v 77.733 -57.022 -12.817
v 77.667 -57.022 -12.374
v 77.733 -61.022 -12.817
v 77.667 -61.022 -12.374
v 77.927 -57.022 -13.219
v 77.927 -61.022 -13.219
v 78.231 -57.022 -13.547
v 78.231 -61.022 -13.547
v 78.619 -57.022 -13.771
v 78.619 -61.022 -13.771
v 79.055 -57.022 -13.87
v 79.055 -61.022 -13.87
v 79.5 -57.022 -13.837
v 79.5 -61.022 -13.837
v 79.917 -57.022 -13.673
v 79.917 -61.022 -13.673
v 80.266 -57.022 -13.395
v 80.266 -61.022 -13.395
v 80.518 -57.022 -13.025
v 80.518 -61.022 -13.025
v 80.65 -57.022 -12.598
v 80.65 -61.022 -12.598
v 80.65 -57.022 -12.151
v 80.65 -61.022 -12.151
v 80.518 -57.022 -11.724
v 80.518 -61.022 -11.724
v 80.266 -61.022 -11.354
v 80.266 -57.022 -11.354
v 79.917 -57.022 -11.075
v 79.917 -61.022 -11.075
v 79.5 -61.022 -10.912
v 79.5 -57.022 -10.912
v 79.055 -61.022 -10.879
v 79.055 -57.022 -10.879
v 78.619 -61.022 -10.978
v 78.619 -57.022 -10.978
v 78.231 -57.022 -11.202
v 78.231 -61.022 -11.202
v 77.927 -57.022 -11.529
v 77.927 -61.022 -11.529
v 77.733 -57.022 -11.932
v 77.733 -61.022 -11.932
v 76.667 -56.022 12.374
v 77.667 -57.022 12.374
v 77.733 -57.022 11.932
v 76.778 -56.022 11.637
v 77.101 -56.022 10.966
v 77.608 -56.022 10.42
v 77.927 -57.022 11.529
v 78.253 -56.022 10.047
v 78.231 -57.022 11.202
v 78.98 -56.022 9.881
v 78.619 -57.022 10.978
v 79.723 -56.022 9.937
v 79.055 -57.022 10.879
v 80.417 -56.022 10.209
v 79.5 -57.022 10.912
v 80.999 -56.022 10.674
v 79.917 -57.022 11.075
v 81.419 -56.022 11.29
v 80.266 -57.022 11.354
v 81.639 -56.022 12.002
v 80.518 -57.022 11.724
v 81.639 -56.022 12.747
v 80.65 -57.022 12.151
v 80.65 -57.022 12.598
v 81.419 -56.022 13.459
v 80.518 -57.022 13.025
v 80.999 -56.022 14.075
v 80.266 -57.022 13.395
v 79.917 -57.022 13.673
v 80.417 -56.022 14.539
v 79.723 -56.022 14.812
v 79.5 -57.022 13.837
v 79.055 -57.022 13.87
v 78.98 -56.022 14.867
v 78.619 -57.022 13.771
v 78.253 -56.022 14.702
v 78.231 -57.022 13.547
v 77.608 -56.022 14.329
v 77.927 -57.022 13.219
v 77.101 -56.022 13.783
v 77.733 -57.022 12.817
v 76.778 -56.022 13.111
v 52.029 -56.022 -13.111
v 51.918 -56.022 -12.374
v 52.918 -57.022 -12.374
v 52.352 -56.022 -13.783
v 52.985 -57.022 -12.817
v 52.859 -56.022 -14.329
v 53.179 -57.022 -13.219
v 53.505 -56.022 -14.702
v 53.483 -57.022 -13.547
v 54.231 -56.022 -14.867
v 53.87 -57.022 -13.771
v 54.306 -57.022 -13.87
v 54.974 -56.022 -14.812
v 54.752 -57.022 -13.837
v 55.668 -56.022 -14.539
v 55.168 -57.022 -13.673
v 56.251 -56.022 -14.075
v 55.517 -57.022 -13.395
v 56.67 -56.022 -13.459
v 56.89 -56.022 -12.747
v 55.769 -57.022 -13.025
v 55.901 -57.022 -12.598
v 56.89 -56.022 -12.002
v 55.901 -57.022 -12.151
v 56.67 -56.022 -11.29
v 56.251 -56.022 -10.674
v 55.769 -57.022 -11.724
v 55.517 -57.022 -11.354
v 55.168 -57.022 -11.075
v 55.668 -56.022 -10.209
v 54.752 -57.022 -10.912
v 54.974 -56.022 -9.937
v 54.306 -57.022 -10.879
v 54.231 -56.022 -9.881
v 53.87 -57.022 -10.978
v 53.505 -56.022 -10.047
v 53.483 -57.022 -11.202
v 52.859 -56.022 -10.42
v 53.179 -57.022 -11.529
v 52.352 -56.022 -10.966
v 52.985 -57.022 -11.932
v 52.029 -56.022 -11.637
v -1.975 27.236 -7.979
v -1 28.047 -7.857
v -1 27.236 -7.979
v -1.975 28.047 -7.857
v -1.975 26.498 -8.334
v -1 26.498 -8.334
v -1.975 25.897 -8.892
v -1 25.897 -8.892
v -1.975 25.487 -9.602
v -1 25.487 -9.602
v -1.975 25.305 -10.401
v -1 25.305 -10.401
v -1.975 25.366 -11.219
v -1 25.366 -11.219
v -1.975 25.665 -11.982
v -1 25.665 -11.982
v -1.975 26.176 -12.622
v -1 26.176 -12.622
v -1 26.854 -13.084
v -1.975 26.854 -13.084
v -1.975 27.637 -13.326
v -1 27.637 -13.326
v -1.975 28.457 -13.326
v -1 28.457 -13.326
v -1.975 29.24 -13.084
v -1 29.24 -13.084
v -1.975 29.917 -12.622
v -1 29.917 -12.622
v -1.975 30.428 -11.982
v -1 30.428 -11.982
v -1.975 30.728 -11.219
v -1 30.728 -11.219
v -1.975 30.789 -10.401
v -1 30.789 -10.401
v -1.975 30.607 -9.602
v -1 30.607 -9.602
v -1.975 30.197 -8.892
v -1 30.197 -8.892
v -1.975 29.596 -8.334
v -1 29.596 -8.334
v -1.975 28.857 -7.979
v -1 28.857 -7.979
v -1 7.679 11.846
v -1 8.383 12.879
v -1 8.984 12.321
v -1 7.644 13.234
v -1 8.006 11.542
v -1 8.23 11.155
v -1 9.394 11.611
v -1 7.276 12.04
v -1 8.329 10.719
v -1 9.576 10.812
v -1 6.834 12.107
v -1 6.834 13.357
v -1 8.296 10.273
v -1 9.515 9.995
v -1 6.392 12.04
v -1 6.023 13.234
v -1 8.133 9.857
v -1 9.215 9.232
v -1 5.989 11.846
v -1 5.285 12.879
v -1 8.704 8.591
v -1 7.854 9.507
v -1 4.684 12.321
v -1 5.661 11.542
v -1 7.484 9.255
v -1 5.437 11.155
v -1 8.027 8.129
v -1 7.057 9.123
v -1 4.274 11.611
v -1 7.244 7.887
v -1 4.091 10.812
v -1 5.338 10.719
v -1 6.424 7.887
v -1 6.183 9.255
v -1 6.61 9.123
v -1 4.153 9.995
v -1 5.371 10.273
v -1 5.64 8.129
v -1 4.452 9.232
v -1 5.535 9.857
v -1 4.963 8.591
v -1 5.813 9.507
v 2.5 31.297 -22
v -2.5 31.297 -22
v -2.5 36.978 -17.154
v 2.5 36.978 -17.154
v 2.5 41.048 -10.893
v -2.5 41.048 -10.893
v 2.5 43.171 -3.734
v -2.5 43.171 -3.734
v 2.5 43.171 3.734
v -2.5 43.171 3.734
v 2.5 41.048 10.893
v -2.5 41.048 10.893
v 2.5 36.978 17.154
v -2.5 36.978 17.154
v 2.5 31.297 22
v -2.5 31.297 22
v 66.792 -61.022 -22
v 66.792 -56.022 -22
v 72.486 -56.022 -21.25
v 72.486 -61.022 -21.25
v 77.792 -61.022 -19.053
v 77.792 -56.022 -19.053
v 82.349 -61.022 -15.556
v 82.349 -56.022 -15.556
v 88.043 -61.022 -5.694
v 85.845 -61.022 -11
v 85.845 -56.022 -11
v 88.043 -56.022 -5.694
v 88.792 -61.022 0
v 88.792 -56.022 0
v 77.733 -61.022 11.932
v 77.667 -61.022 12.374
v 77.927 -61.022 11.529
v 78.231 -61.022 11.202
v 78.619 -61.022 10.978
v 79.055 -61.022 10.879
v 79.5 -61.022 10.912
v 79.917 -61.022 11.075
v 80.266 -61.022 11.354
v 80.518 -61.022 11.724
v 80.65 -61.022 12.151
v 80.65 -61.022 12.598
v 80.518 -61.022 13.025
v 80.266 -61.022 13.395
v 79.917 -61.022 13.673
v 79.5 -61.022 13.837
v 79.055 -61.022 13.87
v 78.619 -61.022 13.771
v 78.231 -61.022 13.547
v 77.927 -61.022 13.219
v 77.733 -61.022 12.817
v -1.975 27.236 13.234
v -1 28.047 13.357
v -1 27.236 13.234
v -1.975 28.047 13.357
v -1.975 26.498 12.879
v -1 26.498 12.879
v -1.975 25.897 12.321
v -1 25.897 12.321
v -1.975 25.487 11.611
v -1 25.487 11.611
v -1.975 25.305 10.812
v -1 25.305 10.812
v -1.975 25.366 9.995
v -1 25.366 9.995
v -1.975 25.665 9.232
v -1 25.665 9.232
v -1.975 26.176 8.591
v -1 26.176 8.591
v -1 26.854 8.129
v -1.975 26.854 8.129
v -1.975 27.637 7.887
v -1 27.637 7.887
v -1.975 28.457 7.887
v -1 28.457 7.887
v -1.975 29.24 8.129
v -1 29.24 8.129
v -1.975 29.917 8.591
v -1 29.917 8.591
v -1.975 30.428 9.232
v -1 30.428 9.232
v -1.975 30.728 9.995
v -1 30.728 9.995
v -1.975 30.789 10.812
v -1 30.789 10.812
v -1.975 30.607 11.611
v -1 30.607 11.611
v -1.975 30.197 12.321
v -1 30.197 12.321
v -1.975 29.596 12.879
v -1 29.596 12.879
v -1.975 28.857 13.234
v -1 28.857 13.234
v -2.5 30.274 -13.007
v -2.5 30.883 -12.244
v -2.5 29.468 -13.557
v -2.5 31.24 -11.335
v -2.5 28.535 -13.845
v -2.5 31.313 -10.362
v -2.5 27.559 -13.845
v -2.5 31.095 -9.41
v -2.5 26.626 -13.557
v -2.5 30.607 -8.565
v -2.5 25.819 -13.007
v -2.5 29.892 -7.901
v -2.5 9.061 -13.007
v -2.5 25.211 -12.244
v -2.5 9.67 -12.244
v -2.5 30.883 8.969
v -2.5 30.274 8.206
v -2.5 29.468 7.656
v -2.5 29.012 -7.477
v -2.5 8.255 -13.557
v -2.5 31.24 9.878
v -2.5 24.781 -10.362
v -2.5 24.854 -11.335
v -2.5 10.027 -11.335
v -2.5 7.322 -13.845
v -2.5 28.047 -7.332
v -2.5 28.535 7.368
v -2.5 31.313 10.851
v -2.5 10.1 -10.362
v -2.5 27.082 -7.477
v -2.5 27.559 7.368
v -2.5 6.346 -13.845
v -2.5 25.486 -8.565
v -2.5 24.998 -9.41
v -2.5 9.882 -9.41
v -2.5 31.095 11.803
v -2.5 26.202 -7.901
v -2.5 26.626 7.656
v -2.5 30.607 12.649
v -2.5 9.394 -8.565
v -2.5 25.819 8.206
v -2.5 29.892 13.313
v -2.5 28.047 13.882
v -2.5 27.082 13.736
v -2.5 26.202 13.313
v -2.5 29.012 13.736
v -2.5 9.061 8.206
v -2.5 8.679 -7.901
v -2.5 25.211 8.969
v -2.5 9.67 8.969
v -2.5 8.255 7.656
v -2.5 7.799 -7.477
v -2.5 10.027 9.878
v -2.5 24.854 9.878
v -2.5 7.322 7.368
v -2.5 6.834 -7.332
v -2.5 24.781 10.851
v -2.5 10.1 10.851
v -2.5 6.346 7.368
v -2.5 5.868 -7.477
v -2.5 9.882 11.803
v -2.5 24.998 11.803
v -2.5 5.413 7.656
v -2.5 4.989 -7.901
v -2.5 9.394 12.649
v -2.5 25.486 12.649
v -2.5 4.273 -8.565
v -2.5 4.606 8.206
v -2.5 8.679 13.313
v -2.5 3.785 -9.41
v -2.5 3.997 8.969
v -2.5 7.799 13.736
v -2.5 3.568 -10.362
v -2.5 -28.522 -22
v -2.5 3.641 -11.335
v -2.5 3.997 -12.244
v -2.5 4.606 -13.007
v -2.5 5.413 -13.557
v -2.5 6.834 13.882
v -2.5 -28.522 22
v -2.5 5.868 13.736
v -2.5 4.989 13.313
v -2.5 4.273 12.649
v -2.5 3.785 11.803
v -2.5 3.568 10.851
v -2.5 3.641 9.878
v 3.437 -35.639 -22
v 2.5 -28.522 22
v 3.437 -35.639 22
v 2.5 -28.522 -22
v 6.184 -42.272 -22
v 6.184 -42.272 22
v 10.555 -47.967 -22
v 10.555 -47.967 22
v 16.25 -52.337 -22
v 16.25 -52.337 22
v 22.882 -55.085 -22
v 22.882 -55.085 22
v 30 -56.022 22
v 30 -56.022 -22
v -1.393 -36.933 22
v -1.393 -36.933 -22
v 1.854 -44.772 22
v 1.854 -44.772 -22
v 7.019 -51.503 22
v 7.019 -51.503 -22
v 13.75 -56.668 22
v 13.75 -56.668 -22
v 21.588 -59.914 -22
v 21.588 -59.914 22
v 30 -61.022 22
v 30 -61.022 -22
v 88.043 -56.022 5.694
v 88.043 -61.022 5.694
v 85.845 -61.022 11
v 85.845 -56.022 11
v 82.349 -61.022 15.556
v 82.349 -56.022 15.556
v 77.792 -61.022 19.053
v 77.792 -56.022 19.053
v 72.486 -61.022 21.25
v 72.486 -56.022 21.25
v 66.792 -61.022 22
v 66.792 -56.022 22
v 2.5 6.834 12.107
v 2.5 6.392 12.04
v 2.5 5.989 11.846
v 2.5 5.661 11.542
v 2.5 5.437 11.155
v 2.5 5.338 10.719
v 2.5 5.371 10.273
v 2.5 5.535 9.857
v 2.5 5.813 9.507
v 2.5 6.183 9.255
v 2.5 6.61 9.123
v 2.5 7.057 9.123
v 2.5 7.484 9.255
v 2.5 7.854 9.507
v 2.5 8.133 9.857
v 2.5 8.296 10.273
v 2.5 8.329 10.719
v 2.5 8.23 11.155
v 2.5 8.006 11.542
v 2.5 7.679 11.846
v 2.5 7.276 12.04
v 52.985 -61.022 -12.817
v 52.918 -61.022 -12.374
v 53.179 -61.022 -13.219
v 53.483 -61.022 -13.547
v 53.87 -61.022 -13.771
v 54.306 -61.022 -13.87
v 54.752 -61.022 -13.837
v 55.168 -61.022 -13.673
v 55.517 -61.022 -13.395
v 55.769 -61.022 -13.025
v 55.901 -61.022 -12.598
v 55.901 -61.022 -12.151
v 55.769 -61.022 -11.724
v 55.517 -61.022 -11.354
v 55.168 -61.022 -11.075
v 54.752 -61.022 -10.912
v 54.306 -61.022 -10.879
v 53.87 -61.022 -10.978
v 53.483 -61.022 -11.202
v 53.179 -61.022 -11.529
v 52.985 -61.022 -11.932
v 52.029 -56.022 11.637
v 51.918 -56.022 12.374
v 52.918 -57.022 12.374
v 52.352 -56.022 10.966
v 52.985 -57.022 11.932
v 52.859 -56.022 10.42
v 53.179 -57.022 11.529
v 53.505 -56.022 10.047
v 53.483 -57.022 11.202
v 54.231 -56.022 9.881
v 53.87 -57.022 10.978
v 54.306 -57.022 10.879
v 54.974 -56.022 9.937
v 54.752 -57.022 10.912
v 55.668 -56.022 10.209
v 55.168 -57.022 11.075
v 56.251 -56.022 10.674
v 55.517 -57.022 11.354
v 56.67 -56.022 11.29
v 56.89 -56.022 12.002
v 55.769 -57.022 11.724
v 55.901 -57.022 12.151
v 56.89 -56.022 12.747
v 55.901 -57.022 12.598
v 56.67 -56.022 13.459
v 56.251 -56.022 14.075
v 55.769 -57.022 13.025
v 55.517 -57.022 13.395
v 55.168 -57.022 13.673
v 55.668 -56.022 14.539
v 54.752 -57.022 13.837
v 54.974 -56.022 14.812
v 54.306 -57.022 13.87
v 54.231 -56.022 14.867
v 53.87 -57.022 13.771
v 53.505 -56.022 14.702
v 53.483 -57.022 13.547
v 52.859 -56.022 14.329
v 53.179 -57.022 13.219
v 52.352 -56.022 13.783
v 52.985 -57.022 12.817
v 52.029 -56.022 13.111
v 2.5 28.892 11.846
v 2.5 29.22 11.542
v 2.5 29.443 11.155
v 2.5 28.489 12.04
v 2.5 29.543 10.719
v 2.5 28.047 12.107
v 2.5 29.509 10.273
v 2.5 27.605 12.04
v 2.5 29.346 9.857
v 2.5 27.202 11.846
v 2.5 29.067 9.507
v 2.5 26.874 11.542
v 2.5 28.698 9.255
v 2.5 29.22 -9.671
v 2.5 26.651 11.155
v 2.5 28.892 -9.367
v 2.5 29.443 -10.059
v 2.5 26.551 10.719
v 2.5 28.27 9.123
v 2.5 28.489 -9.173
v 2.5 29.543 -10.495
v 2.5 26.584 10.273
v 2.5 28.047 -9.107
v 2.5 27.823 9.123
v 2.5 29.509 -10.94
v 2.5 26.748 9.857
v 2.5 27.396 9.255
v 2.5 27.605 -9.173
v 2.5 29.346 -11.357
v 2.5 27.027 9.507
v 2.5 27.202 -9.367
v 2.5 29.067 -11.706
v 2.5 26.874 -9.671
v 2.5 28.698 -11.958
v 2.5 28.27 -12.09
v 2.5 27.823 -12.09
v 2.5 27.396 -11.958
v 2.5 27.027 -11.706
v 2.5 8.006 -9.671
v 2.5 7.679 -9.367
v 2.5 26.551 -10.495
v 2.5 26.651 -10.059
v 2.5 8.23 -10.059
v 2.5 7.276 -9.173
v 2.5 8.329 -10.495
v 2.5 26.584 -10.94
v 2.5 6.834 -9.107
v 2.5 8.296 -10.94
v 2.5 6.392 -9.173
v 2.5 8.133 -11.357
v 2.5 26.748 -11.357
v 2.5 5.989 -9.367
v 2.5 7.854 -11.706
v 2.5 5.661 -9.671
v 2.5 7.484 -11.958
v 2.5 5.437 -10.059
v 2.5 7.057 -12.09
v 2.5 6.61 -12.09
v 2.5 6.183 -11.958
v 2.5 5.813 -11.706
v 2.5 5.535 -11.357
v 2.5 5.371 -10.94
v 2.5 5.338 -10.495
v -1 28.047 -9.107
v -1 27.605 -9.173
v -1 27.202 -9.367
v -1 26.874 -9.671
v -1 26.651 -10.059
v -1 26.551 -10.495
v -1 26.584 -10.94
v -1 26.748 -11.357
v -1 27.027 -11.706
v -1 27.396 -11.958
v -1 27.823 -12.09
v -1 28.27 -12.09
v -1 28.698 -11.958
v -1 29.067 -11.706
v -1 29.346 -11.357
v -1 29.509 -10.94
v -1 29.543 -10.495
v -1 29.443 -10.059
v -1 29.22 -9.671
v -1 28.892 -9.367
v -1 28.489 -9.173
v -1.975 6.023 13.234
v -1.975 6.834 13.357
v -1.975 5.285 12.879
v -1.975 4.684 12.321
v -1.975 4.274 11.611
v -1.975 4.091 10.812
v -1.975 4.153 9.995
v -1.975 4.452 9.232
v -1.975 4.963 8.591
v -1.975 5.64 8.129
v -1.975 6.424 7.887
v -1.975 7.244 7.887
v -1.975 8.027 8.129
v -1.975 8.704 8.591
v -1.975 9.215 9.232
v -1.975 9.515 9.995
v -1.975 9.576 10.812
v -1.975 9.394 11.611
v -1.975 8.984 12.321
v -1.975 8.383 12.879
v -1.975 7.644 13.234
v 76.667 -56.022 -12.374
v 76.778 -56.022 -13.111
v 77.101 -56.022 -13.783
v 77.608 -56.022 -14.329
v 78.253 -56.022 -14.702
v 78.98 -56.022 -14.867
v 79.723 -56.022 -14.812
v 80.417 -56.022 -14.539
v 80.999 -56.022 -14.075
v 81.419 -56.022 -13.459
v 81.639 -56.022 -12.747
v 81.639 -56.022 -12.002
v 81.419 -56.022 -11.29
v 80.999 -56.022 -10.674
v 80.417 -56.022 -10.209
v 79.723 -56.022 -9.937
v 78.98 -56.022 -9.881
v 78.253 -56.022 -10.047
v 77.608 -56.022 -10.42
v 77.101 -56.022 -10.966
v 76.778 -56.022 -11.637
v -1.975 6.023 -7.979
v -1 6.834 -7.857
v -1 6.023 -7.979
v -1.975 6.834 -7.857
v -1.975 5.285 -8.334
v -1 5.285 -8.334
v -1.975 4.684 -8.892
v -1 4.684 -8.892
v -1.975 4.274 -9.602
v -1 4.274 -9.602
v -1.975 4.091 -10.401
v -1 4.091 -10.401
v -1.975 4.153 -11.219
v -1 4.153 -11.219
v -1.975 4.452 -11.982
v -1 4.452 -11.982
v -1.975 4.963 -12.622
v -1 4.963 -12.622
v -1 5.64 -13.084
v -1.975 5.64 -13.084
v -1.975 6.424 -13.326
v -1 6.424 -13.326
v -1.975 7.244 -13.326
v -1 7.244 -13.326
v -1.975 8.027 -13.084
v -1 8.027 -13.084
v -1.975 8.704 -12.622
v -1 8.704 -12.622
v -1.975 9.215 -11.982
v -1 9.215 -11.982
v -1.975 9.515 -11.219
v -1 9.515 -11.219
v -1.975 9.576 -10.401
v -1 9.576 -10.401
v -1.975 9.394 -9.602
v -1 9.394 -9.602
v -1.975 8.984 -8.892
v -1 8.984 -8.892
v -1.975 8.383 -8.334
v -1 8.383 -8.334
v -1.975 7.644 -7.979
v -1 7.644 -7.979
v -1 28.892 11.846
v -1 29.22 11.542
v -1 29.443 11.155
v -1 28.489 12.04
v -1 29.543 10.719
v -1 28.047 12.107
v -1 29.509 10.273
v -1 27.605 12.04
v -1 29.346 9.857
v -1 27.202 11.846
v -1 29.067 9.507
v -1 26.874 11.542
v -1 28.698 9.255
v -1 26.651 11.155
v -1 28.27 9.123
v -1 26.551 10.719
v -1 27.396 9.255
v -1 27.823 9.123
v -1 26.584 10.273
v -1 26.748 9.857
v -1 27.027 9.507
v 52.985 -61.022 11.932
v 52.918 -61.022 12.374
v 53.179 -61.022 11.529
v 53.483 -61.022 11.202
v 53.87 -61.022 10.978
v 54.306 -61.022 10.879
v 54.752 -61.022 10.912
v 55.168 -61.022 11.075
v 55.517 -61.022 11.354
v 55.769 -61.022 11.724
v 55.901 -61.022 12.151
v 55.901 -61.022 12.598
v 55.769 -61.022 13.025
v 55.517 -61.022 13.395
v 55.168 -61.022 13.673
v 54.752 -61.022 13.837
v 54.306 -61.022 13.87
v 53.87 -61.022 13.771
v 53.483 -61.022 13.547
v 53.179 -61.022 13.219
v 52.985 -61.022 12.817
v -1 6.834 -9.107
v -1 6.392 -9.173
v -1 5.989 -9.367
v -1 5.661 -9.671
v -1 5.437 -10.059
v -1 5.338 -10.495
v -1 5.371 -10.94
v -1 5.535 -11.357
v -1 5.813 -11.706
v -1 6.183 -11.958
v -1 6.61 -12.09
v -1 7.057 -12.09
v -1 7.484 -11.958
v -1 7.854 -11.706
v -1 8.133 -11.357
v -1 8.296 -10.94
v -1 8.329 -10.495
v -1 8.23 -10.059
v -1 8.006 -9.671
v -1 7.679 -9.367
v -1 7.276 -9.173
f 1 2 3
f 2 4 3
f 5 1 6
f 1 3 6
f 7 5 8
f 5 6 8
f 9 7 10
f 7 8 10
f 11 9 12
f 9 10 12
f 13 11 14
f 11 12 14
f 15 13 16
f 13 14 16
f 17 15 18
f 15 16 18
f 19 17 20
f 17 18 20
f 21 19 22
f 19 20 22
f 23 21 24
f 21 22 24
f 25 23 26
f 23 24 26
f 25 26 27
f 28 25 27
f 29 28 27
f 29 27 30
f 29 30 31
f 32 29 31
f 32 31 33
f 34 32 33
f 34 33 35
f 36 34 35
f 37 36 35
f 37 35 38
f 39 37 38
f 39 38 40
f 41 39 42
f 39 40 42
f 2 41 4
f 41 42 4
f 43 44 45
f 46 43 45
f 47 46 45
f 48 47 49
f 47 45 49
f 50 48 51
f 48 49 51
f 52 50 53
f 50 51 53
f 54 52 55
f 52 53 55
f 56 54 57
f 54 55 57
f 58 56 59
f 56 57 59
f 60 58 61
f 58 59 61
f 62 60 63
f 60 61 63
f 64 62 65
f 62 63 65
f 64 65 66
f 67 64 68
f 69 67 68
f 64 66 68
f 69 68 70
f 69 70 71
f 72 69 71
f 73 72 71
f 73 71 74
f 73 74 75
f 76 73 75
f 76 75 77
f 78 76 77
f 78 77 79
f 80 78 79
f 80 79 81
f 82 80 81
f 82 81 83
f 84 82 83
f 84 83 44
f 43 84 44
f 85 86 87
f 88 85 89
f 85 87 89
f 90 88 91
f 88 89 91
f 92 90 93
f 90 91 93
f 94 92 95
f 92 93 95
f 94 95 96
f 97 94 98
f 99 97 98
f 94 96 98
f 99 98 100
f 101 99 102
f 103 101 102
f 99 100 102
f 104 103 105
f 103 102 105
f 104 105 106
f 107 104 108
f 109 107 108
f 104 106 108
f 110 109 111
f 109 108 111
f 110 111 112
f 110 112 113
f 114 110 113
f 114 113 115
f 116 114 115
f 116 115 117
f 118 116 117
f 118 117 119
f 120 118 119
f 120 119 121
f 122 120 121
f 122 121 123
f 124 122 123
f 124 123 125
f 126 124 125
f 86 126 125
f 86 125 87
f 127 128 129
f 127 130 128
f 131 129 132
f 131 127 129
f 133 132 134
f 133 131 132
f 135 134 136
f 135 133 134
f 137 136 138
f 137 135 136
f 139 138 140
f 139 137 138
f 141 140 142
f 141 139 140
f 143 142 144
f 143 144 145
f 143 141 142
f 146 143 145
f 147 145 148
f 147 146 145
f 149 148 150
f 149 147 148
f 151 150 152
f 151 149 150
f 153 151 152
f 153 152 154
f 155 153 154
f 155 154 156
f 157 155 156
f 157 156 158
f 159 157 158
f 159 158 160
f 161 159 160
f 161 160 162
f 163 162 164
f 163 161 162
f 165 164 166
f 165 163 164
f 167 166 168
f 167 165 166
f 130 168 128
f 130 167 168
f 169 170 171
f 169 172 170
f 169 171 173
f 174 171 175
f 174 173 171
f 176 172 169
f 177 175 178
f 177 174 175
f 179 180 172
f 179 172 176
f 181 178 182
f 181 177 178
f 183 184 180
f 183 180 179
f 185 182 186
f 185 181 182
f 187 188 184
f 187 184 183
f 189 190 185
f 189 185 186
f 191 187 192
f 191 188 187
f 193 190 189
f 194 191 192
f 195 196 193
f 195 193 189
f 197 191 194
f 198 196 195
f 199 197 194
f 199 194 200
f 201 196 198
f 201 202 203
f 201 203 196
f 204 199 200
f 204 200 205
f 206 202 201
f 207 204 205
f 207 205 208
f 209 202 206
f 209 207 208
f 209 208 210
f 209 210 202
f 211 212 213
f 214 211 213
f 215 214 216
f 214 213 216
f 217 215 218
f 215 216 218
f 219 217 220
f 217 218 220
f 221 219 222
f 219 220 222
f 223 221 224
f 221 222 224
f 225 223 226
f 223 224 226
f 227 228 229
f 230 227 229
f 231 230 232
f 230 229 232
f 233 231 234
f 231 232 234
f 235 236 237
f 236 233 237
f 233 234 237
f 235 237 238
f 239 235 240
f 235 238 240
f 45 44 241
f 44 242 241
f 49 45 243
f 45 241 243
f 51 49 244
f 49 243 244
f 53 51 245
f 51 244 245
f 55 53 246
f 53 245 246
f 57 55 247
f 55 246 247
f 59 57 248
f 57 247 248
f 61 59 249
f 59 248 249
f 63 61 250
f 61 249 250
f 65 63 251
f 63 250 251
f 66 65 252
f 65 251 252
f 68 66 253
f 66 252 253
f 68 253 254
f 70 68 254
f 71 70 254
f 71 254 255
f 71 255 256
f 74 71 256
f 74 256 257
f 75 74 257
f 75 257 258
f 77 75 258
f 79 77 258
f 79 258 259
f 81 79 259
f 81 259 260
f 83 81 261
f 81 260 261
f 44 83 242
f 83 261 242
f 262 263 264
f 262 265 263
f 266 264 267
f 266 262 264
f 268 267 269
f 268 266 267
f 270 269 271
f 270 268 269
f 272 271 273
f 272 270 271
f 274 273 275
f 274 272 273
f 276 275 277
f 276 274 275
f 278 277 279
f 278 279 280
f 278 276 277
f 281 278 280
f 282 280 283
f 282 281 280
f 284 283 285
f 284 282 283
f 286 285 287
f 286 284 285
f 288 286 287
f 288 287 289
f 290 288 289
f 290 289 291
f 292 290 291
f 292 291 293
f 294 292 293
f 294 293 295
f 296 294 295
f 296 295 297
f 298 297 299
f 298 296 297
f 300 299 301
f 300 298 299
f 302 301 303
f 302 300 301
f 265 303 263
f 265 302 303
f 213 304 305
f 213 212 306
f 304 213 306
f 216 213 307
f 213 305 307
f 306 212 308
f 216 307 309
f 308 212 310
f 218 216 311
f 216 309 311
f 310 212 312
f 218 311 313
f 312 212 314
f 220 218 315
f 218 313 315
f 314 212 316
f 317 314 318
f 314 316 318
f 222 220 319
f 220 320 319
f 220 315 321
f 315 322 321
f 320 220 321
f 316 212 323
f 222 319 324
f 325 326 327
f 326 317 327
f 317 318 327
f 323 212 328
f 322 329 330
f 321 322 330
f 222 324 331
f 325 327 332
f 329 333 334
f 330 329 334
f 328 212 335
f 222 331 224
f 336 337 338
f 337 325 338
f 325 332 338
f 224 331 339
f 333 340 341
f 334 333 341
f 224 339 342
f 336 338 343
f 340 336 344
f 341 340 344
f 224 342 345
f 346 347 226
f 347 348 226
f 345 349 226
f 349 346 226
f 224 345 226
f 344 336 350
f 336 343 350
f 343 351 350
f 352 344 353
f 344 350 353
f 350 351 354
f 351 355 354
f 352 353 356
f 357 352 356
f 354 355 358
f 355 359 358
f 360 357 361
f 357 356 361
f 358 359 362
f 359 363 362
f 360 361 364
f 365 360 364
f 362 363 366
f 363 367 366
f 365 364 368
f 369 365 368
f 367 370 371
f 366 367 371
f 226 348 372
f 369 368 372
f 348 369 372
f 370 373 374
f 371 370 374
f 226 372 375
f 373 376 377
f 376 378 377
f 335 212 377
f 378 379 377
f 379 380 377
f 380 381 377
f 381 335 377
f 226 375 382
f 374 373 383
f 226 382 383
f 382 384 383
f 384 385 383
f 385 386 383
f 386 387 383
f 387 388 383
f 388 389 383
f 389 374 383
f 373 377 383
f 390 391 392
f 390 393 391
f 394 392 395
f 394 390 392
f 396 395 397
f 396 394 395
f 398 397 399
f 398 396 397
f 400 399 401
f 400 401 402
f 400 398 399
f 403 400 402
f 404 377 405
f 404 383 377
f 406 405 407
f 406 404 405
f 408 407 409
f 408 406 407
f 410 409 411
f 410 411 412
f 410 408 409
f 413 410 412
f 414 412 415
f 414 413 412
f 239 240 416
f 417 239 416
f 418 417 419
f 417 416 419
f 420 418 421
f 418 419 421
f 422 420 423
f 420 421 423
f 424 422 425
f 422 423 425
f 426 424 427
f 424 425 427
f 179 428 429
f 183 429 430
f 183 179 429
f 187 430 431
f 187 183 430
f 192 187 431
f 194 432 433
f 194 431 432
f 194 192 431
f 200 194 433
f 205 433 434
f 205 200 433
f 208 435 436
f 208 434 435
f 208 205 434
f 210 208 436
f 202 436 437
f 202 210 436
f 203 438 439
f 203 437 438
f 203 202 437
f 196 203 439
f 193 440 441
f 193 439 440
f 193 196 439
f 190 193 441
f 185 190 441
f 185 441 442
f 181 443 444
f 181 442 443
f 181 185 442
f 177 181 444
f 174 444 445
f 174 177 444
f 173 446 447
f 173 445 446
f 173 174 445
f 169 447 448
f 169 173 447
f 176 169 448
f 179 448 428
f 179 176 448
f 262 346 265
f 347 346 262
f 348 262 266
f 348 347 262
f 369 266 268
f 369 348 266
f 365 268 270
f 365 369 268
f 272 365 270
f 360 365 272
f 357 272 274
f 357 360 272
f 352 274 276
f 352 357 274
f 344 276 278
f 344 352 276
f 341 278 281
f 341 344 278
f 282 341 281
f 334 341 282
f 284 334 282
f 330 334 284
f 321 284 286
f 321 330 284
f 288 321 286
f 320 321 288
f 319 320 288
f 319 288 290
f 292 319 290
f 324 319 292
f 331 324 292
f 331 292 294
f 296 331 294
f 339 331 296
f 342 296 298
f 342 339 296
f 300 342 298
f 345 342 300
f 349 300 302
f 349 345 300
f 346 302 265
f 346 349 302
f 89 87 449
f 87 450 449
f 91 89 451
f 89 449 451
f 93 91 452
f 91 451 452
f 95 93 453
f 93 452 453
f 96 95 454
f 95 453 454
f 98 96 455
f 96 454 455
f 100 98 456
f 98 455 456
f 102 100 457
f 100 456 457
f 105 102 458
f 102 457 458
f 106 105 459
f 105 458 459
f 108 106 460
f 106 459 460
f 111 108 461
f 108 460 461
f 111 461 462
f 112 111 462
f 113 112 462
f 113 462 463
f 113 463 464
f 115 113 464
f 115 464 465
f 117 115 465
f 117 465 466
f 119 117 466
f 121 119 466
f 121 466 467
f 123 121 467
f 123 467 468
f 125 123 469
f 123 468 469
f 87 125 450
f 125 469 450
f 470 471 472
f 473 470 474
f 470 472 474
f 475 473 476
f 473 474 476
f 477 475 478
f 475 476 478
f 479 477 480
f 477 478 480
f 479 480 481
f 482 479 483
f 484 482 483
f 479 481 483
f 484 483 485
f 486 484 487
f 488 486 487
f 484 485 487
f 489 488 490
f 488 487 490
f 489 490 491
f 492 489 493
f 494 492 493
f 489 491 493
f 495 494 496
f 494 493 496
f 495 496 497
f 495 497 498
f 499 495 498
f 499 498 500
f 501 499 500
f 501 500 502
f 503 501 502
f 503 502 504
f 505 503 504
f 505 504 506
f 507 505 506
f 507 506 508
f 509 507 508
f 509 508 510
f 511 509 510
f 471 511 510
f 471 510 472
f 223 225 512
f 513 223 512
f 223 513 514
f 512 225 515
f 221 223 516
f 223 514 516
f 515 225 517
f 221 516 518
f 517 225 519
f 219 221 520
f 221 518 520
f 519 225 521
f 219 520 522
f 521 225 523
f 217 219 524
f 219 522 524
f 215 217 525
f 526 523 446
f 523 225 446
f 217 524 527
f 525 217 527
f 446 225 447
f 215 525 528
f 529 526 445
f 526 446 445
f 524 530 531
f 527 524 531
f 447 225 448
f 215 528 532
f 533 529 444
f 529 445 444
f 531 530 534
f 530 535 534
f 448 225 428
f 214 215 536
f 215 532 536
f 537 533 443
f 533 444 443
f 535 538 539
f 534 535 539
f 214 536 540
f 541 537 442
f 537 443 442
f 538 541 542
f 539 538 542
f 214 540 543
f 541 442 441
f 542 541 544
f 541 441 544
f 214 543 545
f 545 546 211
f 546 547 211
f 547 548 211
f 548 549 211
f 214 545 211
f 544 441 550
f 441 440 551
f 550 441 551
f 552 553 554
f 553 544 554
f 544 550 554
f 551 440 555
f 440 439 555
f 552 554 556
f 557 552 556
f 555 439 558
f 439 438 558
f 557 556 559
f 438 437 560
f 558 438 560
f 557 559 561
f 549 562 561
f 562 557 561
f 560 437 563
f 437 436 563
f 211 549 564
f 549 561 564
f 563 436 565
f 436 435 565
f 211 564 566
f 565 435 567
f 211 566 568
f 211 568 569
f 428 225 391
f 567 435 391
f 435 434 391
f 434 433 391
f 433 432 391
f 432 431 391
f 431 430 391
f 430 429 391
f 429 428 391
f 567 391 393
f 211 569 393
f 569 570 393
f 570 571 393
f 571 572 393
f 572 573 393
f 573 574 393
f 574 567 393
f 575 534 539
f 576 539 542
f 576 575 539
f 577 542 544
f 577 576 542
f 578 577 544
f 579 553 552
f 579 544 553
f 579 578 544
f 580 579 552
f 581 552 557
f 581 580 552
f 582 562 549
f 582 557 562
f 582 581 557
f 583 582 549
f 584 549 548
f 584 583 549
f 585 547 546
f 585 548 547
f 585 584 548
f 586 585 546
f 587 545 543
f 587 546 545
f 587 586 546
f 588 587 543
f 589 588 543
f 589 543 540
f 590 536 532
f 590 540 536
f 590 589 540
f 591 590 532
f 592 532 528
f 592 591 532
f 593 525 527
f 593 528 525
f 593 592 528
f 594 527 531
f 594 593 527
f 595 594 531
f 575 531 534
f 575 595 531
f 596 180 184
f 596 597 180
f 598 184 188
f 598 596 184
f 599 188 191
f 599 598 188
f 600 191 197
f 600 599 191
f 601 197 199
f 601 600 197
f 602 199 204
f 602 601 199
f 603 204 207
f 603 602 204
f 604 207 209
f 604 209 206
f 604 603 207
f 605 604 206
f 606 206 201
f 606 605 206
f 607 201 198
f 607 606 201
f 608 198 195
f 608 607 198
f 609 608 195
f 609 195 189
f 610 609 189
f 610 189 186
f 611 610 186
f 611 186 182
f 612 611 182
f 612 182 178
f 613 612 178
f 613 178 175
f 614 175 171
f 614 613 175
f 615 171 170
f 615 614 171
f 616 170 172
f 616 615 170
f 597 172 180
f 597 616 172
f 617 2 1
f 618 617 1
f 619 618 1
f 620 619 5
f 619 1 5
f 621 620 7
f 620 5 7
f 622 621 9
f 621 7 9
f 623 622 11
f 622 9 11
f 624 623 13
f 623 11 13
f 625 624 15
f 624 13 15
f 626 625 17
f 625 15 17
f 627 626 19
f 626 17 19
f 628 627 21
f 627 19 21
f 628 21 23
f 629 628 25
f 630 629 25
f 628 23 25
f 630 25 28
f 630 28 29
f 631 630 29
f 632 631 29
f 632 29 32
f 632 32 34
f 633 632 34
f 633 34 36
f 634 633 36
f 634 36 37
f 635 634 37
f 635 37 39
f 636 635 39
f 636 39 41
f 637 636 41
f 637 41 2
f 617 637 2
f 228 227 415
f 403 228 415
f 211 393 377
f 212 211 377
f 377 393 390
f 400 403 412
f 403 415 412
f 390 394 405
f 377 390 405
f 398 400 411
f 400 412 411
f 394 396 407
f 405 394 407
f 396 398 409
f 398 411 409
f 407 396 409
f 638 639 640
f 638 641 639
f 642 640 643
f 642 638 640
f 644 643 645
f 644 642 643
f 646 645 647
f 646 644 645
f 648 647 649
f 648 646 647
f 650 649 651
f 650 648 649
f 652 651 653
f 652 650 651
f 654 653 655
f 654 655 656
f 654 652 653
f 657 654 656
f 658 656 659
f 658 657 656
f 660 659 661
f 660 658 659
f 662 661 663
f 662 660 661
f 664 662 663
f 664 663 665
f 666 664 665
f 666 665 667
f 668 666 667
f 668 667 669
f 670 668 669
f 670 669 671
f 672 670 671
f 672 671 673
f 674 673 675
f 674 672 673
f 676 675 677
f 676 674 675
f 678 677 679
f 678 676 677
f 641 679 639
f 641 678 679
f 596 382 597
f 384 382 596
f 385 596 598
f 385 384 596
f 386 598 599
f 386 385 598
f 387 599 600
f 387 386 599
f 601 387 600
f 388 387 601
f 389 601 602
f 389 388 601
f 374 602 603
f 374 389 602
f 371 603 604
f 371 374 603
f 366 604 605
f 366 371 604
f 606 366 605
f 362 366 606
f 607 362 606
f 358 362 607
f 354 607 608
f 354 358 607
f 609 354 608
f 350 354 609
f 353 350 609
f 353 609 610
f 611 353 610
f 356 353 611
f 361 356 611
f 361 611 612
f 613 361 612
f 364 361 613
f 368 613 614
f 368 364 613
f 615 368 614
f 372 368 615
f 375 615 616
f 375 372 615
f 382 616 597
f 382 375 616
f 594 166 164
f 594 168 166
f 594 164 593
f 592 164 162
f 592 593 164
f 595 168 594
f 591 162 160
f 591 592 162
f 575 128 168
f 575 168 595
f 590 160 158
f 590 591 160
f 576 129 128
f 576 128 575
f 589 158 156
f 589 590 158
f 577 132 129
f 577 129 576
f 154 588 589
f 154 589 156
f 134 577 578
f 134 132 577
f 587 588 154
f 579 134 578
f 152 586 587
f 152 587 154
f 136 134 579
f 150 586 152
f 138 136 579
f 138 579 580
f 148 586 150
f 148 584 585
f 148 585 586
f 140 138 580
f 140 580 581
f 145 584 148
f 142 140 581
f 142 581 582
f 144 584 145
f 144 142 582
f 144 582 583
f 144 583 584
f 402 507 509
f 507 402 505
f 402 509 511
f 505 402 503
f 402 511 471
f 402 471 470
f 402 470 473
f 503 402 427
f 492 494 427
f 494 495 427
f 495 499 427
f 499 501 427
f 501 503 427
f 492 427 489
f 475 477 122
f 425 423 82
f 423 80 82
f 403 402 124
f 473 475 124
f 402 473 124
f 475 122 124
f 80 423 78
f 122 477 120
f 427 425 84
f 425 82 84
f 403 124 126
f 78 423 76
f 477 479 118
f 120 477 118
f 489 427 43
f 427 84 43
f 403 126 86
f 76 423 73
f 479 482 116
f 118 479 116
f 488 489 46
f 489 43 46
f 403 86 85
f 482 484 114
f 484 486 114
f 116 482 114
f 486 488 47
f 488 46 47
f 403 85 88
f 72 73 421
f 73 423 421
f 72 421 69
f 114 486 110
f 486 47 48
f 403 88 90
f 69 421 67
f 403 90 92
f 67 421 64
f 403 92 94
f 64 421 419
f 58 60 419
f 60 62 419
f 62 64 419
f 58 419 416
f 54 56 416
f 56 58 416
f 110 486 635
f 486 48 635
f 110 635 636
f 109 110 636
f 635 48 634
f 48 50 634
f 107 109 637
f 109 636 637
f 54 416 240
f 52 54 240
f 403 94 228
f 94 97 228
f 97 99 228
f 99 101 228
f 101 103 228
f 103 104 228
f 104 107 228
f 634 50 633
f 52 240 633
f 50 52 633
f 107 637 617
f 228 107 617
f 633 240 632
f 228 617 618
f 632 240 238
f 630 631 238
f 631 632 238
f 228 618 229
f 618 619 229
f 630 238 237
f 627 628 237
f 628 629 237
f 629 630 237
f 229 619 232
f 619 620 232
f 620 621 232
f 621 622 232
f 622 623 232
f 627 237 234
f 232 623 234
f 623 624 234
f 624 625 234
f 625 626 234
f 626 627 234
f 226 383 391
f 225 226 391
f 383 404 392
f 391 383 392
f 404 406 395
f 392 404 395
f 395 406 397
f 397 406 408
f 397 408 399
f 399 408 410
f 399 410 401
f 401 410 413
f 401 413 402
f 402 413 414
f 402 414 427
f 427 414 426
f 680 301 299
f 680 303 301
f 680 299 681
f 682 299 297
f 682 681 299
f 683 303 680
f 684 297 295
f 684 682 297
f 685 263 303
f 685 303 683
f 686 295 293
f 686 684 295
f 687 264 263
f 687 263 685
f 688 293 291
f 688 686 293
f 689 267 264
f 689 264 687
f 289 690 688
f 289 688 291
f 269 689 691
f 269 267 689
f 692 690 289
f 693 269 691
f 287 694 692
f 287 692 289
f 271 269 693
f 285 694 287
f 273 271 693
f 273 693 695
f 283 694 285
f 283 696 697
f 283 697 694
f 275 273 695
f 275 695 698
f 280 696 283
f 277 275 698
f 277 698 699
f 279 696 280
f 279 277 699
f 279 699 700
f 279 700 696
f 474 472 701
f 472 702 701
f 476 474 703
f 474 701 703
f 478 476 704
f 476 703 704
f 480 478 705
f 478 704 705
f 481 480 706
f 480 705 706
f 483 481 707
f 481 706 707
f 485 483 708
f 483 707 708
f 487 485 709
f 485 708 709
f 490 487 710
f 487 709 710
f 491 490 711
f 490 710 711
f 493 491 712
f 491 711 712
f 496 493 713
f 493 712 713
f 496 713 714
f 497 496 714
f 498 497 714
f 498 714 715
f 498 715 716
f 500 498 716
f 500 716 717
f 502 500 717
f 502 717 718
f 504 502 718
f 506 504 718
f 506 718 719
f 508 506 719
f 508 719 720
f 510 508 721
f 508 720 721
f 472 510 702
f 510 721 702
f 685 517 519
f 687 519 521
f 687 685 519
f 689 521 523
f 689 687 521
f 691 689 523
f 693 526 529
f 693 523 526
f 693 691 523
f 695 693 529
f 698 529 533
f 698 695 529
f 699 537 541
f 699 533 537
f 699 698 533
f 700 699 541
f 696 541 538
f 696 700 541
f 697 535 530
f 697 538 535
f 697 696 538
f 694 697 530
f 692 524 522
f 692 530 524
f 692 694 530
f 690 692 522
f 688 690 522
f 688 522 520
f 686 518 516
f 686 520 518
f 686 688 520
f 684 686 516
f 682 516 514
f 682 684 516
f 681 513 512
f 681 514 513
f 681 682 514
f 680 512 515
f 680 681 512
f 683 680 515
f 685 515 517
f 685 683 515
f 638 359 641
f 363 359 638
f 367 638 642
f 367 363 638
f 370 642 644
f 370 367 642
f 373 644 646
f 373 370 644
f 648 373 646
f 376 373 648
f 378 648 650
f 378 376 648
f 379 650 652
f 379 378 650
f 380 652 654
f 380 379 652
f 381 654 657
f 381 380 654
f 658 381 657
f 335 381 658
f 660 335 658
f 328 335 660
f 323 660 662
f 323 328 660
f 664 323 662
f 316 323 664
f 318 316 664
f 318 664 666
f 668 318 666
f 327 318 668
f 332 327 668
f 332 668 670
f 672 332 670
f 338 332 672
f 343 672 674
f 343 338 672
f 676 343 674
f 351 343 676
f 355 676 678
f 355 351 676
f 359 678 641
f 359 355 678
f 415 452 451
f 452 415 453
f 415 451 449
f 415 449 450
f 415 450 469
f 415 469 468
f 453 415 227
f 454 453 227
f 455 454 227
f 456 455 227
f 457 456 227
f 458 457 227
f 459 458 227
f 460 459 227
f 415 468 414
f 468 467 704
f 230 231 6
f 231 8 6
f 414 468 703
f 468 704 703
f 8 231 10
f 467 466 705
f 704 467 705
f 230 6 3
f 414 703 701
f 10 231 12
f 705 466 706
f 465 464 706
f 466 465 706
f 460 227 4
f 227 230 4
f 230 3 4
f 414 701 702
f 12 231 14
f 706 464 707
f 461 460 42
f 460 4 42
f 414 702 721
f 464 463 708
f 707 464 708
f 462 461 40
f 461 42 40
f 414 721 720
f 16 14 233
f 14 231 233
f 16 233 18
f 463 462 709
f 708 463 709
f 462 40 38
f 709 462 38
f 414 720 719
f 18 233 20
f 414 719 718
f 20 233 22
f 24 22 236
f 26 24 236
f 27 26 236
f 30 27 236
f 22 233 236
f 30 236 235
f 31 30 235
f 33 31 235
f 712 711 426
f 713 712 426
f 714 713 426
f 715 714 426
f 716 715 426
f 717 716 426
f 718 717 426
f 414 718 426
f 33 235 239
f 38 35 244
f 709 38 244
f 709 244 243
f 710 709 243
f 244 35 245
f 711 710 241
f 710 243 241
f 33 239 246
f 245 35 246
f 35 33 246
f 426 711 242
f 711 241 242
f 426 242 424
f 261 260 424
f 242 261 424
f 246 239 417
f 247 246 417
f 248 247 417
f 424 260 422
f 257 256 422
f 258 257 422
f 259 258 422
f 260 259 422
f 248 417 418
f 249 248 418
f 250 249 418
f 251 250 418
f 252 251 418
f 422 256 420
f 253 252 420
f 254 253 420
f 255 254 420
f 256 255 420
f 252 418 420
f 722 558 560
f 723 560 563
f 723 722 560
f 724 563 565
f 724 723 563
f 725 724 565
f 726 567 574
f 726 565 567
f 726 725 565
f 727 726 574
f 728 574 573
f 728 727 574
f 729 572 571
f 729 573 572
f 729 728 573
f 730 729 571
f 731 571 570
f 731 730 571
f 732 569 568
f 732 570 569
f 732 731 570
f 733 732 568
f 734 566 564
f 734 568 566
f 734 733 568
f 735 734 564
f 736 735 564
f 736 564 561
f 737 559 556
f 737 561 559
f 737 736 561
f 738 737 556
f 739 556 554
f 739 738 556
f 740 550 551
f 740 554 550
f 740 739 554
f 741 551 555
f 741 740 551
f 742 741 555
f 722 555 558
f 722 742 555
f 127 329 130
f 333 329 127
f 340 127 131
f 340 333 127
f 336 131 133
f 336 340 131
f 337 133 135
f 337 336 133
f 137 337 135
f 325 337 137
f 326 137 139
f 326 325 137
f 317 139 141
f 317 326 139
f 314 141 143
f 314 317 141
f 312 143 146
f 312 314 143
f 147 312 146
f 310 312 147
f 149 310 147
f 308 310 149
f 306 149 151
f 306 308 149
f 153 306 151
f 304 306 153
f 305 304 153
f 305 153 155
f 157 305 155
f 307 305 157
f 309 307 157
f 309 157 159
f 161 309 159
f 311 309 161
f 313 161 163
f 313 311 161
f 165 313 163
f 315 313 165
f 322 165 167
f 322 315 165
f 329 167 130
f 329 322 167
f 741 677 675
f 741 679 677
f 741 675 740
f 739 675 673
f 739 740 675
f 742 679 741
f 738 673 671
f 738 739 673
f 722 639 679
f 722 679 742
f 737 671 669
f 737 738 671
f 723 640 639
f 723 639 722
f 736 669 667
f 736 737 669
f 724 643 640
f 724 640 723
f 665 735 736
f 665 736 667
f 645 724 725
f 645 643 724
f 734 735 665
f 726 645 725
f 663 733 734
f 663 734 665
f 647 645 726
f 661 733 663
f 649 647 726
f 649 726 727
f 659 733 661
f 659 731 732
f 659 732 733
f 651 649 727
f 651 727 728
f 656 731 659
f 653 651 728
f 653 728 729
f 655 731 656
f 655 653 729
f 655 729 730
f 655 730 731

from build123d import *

# Parameters (mm, degrees)
SKETCH_2_W                   = 5
SKETCH_2_H                   = 44
CUT_EXTRUDE_1_DEPTH          = 136.500823221
CUT_EXTRUDE_2_DEPTH          = 112.990773585
HOLE_WIZARD_M31_D            = 3
HOLE_WIZARD_M31_CSINK_D      = 5
HOLE_WIZARD_M31_CSINK_ANGLE  = 90
HOLE_WIZARD_M31_2_AT_2_COUNT = 2
HOLE_WIZARD_M31_2_AT_2_PITCH = 21.213203436
HOLE_WIZARD_M31_2_AT_3_COUNT = 2
HOLE_WIZARD_M31_2_AT_3_PITCH = 21.213203436
HOLE_WIZARD_M31_2_AT_4_COUNT = 2
HOLE_WIZARD_M31_2_AT_4_PITCH = 30


with BuildPart() as part:
    # По траектории1: sweep along a path in Эскиз1
    with BuildLine(Plane.XY) as sweep_1_path:
        Line((0, 43.940273354), (0, -28.521737175))
        ThreePointArc((0, -28.521737175), (8.786796564, -49.734940611), (30, -58.521737175))
        Line((30, -58.521737175), (66.792283136, -58.521737175))
        Line((66.792283136, -58.521737175), (88.792283136, -58.521737175))
    # Эскиз2 → По траектории1 (sweep)
    with BuildSketch(Plane(origin=(0, 0, 0), x_dir=(1, 0, 0), z_dir=(0, 1, 0))):
        Rectangle(SKETCH_2_W, SKETCH_2_H)
    sweep(path=sweep_1_path.line)

    # Эскиз3 → Вырез-Вытянуть1 (cut, through all)
    with BuildSketch(Plane(origin=(0, -56.021737175, 0), x_dir=(1, 0, 0), z_dir=(0, 1, 0))):
        with BuildLine():
            Line((88.792283136, 22), (66.792283136, 22))
            ThreePointArc((66.792283136, 22), (82.348632323, 15.556349186), (88.792283136, 0))
            Line((88.792283136, 0), (88.792283136, 22))
        make_face()
        with BuildLine():
            Line((88.792283136, -22), (88.792283136, 0))
            ThreePointArc((88.792283136, 0), (82.348632323, -15.556349186), (66.792283136, -22))
            Line((66.792283136, -22), (88.792283136, -22))
        make_face()
    extrude(amount=-CUT_EXTRUDE_1_DEPTH, mode=Mode.SUBTRACT)

    # Эскиз4 → Вырез-Вытянуть2 (cut, through all)
    with BuildSketch(Plane.ZY.offset(2.5)):
        with BuildLine():
            Line((22, 43.940273354), (-22, 43.940273354))
            Line((-22, 43.940273354), (-22, 31.296679815))
            ThreePointArc((-22, 31.296679815), (0, 43.440273354), (22, 31.296679815))
            Line((22, 31.296679815), (22, 43.940273354))
        make_face()
    extrude(amount=-CUT_EXTRUDE_2_DEPTH, mode=Mode.SUBTRACT)

    # Hole Wizard M31 (through all)
    with Locations(Plane(origin=(0, -56.021737175, 0), x_dir=(1, 0, 0), z_dir=(0, 1, 0))):
        with Locations((54.417914466, -12.374368671), (79.166651807, -12.374368671), (79.166651807, 12.374368671), (54.417914466, 12.374368671)):
            CounterSinkHole(HOLE_WIZARD_M31_D / 2, HOLE_WIZARD_M31_CSINK_D / 2, counter_sink_angle=HOLE_WIZARD_M31_CSINK_ANGLE)

    # Эскиз10 → Hole Wizard M31 2 (revolve, cut)
    with BuildSketch(Plane(origin=(-2.5, 28.046875072, -10.606601718), x_dir=(0, 0, 1), z_dir=(0, 1, 0))):
        Polygon((0, 0), (0, 91.292283136), (1.5, 91.292283136), (1.5, 1.5), (2.75, 1.5), (2.75, 0.525), (3.275, 0), align=None)
    hole_wizard_m31_2 = revolve(axis=Axis((-8.85, 28.046875072, -10.606601718), (1, 0, 0)), mode=Mode.SUBTRACT)

    # Hole Wizard M31 2 at 2: Hole Wizard M31 2 ×2
    with Locations(*[(0, 0, i * HOLE_WIZARD_M31_2_AT_2_PITCH) for i in range(1, HOLE_WIZARD_M31_2_AT_2_COUNT)]):
        add(hole_wizard_m31_2, mode=Mode.SUBTRACT)

    # Hole Wizard M31 2 at 3: Hole Wizard M31 2 ×2
    with Locations(*[(0, -i * HOLE_WIZARD_M31_2_AT_3_PITCH, 0) for i in range(1, HOLE_WIZARD_M31_2_AT_3_COUNT)]):
        add(hole_wizard_m31_2, mode=Mode.SUBTRACT)

    # Hole Wizard M31 2 at 4: Hole Wizard M31 2 ×2
    with Locations(*[Vector(0, -0.7071067811865492, 0.7071067811865459) * (i * HOLE_WIZARD_M31_2_AT_4_PITCH) for i in range(1, HOLE_WIZARD_M31_2_AT_4_COUNT)]):
        add(hole_wizard_m31_2, mode=Mode.SUBTRACT)


solid = part.part
